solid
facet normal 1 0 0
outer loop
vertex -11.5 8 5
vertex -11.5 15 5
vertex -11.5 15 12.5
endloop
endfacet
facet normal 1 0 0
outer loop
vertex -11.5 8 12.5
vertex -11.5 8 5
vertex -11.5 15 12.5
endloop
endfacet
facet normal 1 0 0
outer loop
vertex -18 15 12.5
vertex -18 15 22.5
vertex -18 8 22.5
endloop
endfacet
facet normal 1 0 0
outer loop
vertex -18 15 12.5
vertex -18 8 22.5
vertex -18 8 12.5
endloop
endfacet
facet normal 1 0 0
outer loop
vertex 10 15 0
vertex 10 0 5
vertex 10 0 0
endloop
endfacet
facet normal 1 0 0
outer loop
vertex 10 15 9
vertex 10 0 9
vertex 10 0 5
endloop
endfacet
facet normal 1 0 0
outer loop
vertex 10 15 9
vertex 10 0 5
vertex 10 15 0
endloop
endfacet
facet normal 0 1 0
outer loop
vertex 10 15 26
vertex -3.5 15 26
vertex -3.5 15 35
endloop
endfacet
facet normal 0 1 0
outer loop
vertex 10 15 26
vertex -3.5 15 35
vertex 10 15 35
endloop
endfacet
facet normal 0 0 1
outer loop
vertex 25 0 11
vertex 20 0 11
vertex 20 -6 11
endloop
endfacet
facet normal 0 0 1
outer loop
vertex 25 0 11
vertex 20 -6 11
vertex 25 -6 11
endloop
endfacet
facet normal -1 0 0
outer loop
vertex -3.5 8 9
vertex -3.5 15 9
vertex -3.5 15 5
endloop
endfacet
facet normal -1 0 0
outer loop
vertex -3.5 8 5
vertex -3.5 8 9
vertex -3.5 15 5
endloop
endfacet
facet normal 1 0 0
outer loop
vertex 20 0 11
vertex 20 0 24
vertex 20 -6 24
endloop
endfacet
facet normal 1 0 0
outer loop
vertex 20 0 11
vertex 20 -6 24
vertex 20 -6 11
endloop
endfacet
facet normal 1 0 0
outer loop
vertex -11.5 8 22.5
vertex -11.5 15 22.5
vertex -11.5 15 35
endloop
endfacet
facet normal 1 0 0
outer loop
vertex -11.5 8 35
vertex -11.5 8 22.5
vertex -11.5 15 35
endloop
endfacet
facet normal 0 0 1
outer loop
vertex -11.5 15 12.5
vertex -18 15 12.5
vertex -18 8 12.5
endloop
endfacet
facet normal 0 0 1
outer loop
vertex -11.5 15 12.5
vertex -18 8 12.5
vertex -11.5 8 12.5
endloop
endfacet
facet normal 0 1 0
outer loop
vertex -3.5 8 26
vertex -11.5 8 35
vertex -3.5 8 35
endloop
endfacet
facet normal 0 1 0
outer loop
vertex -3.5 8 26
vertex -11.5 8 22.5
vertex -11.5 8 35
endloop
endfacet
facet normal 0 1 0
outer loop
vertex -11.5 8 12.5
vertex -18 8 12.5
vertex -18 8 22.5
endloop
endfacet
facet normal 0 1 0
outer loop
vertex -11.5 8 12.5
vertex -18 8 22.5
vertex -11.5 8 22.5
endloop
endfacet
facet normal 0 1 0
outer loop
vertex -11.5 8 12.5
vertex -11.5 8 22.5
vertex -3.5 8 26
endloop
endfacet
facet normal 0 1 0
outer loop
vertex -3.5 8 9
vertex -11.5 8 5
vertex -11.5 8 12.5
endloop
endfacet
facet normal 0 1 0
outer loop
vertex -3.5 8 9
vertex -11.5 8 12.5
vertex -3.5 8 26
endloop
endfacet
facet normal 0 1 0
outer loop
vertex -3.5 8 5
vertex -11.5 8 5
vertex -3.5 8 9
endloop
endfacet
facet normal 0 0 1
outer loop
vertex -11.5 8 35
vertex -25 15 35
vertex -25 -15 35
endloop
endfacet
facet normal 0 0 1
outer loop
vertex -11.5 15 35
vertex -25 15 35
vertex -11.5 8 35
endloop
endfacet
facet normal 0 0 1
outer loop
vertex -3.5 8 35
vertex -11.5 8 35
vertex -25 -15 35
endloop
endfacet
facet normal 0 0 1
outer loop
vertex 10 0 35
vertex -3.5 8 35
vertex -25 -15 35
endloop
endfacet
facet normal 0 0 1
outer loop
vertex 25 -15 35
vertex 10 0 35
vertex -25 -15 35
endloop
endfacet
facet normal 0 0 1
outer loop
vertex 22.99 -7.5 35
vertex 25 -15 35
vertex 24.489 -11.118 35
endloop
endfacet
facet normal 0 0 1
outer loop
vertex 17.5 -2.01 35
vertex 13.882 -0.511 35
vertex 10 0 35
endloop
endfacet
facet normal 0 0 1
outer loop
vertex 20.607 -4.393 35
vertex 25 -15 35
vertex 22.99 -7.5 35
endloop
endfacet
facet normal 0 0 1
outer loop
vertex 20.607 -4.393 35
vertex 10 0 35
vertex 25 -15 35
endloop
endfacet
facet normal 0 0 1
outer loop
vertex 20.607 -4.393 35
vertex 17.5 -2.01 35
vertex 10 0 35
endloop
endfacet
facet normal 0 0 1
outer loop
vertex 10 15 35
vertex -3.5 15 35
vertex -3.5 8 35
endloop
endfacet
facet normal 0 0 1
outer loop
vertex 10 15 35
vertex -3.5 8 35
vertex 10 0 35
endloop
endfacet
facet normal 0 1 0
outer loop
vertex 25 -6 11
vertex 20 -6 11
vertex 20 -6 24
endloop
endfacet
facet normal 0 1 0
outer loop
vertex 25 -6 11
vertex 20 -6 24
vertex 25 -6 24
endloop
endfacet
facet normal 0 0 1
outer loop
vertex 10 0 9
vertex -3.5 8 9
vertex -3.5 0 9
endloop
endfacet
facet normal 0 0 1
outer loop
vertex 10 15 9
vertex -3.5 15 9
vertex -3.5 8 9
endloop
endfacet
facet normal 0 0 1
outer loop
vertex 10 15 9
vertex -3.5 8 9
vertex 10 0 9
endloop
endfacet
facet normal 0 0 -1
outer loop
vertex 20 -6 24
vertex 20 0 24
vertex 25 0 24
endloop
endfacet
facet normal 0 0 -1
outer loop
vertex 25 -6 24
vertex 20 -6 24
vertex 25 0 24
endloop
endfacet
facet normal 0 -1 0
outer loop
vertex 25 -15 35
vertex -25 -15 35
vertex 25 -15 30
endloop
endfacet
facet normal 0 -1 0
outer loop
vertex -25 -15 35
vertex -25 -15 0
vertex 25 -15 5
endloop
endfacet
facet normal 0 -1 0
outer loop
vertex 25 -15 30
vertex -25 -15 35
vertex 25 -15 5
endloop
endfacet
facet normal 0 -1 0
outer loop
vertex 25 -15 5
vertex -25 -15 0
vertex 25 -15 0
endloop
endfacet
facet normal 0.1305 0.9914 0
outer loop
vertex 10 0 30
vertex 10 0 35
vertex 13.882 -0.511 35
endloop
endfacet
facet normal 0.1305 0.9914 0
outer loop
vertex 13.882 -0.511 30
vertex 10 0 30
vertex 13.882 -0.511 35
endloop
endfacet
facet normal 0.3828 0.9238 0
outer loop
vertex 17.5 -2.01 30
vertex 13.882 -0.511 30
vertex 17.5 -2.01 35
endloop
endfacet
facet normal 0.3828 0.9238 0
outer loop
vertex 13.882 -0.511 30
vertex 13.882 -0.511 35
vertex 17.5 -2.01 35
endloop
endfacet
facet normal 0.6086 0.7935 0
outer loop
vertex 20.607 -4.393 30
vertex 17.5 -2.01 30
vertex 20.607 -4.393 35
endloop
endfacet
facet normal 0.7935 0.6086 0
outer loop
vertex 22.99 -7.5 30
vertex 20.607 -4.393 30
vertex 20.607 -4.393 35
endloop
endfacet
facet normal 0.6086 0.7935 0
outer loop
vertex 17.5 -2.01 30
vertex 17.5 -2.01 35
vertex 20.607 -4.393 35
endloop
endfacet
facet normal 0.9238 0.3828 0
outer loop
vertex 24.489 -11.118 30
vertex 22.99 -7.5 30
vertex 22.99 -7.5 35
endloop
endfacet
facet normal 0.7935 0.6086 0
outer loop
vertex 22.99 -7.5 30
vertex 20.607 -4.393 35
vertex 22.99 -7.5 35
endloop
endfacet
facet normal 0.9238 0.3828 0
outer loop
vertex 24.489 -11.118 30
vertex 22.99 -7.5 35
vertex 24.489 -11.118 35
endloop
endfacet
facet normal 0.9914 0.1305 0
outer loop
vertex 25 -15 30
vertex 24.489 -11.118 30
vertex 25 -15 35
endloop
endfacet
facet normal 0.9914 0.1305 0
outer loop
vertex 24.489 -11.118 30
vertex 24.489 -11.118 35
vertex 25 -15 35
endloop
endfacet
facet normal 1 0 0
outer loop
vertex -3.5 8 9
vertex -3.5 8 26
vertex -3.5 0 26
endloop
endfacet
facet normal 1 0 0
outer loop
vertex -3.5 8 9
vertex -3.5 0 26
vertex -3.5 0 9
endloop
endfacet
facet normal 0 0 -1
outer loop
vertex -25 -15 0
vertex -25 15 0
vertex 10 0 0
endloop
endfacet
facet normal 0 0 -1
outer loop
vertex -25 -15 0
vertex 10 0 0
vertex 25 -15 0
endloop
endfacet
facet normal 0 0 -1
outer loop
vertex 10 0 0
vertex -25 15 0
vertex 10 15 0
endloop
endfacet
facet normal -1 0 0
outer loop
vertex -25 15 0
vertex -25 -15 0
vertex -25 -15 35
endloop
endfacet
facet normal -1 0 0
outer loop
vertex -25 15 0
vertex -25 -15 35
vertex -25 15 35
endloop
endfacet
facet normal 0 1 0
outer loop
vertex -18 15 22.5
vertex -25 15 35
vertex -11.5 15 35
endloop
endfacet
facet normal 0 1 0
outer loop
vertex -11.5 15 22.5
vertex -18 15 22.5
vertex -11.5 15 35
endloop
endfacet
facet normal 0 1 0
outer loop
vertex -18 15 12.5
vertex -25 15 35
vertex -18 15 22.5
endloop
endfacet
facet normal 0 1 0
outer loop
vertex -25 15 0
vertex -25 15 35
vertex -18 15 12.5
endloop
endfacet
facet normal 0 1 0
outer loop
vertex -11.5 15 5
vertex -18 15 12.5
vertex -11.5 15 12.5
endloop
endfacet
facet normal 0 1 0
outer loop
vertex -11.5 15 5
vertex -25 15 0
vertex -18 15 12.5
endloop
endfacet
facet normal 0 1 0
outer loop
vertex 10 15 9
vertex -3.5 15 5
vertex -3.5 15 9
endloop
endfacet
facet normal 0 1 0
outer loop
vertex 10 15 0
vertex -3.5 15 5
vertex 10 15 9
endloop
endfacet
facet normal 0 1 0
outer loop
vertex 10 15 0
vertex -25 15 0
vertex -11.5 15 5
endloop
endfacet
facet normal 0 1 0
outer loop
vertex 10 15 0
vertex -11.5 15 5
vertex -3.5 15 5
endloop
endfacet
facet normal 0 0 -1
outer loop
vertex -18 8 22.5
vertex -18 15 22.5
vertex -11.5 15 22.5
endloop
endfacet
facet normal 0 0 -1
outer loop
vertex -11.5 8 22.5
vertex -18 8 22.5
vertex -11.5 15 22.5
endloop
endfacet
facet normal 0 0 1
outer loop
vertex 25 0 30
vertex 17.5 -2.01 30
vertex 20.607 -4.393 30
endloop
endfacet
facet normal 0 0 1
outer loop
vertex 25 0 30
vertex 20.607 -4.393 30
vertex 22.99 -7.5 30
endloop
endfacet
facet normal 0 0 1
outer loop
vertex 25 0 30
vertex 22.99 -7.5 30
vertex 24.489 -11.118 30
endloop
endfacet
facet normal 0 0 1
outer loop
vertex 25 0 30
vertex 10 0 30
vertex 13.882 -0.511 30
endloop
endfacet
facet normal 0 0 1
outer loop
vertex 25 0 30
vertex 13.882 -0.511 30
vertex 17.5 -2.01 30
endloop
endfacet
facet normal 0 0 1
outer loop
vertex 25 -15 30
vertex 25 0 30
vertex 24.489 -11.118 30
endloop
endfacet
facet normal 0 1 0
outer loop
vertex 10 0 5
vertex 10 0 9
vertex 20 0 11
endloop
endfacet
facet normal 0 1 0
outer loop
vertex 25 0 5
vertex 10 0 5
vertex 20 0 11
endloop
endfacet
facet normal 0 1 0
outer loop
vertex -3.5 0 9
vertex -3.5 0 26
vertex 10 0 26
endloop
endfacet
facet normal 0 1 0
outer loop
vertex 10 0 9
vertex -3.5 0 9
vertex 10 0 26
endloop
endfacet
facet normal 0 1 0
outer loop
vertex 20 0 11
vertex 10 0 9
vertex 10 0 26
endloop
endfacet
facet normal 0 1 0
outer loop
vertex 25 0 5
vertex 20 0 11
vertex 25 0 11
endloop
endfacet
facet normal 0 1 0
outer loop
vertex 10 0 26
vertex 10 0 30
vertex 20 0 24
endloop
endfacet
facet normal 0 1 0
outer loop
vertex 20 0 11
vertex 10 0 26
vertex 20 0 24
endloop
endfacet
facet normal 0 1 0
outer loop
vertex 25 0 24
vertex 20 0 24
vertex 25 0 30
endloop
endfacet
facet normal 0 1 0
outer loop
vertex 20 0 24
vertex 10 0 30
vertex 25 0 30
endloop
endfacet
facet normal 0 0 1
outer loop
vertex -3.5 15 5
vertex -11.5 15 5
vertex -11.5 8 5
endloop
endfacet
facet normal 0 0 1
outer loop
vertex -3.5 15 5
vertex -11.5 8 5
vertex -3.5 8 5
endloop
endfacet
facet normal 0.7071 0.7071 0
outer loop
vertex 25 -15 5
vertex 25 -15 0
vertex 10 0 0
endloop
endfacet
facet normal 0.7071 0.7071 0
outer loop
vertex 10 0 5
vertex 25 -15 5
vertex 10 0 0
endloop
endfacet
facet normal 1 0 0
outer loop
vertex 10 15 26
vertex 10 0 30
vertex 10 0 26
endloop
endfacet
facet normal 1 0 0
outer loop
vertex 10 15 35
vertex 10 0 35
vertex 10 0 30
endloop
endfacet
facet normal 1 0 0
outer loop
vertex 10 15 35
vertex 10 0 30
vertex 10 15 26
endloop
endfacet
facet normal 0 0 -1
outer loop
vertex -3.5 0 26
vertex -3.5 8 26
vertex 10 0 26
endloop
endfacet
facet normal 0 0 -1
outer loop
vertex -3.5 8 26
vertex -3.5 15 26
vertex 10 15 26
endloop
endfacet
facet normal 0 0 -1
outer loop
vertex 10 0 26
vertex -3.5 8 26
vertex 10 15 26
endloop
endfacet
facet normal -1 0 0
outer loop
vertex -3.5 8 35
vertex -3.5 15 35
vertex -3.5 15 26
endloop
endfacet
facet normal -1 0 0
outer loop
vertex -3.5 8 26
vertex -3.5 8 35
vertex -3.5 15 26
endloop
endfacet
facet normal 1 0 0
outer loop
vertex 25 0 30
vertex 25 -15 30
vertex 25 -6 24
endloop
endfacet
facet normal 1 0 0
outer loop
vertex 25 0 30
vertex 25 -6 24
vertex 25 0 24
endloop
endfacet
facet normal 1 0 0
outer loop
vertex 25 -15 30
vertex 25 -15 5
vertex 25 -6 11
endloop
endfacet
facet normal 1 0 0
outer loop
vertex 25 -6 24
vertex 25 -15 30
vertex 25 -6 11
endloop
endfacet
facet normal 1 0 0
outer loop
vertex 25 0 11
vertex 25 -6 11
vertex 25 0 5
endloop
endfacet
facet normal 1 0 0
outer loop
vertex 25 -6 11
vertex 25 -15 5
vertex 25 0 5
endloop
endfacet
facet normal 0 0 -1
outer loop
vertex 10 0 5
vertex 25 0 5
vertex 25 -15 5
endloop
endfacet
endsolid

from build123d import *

# Parameters (mm, degrees)
SKETCH_1_W          = 50
SKETCH_1_H          = 30
EXTRUDE_1_DEPTH     = 35
SKETCH_2_W          = 15
SKETCH_2_H          = 15
CUT_EXTRUDE_1_DEPTH = 46.552167896
SKETCH_3_W          = 13.5
SKETCH_3_H          = 10
CUT_EXTRUDE_2_DEPTH = 15
SKETCH_3_3_W        = 8
SKETCH_3_3_H        = 12.5
SKETCH_3_3_H_2      = 10
SKETCH_3_3_H_3      = 7.5
SKETCH_3_3_W_2      = 6.5
CUT_EXTRUDE_3_DEPTH = 7
SKETCH_6_W          = 5
SKETCH_6_H          = 13
CUT_EXTRUDE_4_DEPTH = 6
CUT_EXTRUDE_5_REACH = 54.44
SKETCH_7_W          = 13.5
SKETCH_7_H          = 17
CUT_EXTRUDE_6_DEPTH = 5
CUT_EXTRUDE_7_DEPTH = 5


with BuildPart() as part:
    # Эскиз1 → Бобышка-Вытянуть1 (new body)
    with BuildSketch(Plane.XY):
        Rectangle(SKETCH_1_W, SKETCH_1_H)
    extrude(amount=EXTRUDE_1_DEPTH)

    # Эскиз2 → Вырез-Вытянуть1 (cut, through all)
    with BuildSketch(Plane.XY.offset(35)):
        with Locations((17.5, 7.5)):
            Rectangle(SKETCH_2_W, SKETCH_2_H)
    extrude(amount=-CUT_EXTRUDE_1_DEPTH, mode=Mode.SUBTRACT)

    # Эскиз3 → Вырез-Вытянуть2 (cut)
    with BuildSketch(Plane(origin=(0, 15, 0), x_dir=(1, 0, 0), z_dir=(0, 1, 0))):
        with Locations((3.25, -17.5)):
            Rectangle(SKETCH_3_W, SKETCH_3_H)
    extrude(amount=-CUT_EXTRUDE_2_DEPTH, mode=Mode.SUBTRACT)

    # Эскиз3<3> → Вырез-Вытянуть3 (cut)
    with BuildSketch(Plane(origin=(0, 15, 0), x_dir=(1, 0, 0), z_dir=(0, 1, 0))):
        with Locations((-7.5, -28.75)):
            Rectangle(SKETCH_3_3_W, SKETCH_3_3_H)
        with Locations((-7.5, -17.5)):
            Rectangle(SKETCH_3_3_W, SKETCH_3_3_H_2)
        with Locations((-7.5, -8.75)):
            Rectangle(SKETCH_3_3_W, SKETCH_3_3_H_3)
        with Locations((-14.75, -17.5)):
            Rectangle(SKETCH_3_3_W_2, SKETCH_3_3_H_2)
    extrude(amount=-CUT_EXTRUDE_3_DEPTH, mode=Mode.SUBTRACT)

    # Эскиз6 → Вырез-Вытянуть4 (cut)
    with BuildSketch(Plane(origin=(0, 0, 0), x_dir=(1, 0, 0), z_dir=(0, 1, 0))):
        with Locations((22.5, -17.5)):
            Rectangle(SKETCH_6_W, SKETCH_6_H)
    extrude(amount=-CUT_EXTRUDE_4_DEPTH, mode=Mode.SUBTRACT)

    # Вырез-Вытянуть5: up to this face of the body (flat: up to its plane)
    cut_extrude_5_end = Plane(part.part.faces().sort_by_distance((13.720588235, 0, 17.5))[0])
    # Эскиз7 → Вырез-Вытянуть5 (cut, up to the picked face)
    with BuildSketch(Plane(origin=(0, 15, 0), x_dir=(1, 0, 0), z_dir=(0, 1, 0)), mode=Mode.PRIVATE) as cut_extrude_5_sk1:
        with Locations((3.25, -17.5)):
            Rectangle(SKETCH_7_W, SKETCH_7_H)
    cut_extrude_5_tool1 = split(extrude(cut_extrude_5_sk1.sketch, amount=-CUT_EXTRUDE_5_REACH, mode=Mode.PRIVATE), bisect_by=cut_extrude_5_end, keep=Keep.BOTH, mode=Mode.PRIVATE)
    add(cut_extrude_5_tool1.solids().sort_by(Axis((3.25, 15, 17.5), (0, -1, 0)))[0], mode=Mode.SUBTRACT)

    # Эскиз8 → Вырез-Вытянуть6 (cut)
    with BuildSketch(Plane.XY.offset(35)):
        with BuildLine():
            Line((25, 0), (10, 0))
            ThreePointArc((10, 0), (20.606601718, -4.393398282), (25, -15))
            Line((25, -15), (25, 0))
        make_face()
    extrude(amount=-CUT_EXTRUDE_6_DEPTH, mode=Mode.SUBTRACT)

    # Эскиз9 → Вырез-Вытянуть7 (cut)
    with BuildSketch(Plane(origin=(0, 0, 0), x_dir=(-1, 0, 0), z_dir=(0, 0, -1))):
        Polygon((-25, -15), (-10, 0), (-25, 0), align=None)
    extrude(amount=-CUT_EXTRUDE_7_DEPTH, mode=Mode.SUBTRACT)


solid = part.part
